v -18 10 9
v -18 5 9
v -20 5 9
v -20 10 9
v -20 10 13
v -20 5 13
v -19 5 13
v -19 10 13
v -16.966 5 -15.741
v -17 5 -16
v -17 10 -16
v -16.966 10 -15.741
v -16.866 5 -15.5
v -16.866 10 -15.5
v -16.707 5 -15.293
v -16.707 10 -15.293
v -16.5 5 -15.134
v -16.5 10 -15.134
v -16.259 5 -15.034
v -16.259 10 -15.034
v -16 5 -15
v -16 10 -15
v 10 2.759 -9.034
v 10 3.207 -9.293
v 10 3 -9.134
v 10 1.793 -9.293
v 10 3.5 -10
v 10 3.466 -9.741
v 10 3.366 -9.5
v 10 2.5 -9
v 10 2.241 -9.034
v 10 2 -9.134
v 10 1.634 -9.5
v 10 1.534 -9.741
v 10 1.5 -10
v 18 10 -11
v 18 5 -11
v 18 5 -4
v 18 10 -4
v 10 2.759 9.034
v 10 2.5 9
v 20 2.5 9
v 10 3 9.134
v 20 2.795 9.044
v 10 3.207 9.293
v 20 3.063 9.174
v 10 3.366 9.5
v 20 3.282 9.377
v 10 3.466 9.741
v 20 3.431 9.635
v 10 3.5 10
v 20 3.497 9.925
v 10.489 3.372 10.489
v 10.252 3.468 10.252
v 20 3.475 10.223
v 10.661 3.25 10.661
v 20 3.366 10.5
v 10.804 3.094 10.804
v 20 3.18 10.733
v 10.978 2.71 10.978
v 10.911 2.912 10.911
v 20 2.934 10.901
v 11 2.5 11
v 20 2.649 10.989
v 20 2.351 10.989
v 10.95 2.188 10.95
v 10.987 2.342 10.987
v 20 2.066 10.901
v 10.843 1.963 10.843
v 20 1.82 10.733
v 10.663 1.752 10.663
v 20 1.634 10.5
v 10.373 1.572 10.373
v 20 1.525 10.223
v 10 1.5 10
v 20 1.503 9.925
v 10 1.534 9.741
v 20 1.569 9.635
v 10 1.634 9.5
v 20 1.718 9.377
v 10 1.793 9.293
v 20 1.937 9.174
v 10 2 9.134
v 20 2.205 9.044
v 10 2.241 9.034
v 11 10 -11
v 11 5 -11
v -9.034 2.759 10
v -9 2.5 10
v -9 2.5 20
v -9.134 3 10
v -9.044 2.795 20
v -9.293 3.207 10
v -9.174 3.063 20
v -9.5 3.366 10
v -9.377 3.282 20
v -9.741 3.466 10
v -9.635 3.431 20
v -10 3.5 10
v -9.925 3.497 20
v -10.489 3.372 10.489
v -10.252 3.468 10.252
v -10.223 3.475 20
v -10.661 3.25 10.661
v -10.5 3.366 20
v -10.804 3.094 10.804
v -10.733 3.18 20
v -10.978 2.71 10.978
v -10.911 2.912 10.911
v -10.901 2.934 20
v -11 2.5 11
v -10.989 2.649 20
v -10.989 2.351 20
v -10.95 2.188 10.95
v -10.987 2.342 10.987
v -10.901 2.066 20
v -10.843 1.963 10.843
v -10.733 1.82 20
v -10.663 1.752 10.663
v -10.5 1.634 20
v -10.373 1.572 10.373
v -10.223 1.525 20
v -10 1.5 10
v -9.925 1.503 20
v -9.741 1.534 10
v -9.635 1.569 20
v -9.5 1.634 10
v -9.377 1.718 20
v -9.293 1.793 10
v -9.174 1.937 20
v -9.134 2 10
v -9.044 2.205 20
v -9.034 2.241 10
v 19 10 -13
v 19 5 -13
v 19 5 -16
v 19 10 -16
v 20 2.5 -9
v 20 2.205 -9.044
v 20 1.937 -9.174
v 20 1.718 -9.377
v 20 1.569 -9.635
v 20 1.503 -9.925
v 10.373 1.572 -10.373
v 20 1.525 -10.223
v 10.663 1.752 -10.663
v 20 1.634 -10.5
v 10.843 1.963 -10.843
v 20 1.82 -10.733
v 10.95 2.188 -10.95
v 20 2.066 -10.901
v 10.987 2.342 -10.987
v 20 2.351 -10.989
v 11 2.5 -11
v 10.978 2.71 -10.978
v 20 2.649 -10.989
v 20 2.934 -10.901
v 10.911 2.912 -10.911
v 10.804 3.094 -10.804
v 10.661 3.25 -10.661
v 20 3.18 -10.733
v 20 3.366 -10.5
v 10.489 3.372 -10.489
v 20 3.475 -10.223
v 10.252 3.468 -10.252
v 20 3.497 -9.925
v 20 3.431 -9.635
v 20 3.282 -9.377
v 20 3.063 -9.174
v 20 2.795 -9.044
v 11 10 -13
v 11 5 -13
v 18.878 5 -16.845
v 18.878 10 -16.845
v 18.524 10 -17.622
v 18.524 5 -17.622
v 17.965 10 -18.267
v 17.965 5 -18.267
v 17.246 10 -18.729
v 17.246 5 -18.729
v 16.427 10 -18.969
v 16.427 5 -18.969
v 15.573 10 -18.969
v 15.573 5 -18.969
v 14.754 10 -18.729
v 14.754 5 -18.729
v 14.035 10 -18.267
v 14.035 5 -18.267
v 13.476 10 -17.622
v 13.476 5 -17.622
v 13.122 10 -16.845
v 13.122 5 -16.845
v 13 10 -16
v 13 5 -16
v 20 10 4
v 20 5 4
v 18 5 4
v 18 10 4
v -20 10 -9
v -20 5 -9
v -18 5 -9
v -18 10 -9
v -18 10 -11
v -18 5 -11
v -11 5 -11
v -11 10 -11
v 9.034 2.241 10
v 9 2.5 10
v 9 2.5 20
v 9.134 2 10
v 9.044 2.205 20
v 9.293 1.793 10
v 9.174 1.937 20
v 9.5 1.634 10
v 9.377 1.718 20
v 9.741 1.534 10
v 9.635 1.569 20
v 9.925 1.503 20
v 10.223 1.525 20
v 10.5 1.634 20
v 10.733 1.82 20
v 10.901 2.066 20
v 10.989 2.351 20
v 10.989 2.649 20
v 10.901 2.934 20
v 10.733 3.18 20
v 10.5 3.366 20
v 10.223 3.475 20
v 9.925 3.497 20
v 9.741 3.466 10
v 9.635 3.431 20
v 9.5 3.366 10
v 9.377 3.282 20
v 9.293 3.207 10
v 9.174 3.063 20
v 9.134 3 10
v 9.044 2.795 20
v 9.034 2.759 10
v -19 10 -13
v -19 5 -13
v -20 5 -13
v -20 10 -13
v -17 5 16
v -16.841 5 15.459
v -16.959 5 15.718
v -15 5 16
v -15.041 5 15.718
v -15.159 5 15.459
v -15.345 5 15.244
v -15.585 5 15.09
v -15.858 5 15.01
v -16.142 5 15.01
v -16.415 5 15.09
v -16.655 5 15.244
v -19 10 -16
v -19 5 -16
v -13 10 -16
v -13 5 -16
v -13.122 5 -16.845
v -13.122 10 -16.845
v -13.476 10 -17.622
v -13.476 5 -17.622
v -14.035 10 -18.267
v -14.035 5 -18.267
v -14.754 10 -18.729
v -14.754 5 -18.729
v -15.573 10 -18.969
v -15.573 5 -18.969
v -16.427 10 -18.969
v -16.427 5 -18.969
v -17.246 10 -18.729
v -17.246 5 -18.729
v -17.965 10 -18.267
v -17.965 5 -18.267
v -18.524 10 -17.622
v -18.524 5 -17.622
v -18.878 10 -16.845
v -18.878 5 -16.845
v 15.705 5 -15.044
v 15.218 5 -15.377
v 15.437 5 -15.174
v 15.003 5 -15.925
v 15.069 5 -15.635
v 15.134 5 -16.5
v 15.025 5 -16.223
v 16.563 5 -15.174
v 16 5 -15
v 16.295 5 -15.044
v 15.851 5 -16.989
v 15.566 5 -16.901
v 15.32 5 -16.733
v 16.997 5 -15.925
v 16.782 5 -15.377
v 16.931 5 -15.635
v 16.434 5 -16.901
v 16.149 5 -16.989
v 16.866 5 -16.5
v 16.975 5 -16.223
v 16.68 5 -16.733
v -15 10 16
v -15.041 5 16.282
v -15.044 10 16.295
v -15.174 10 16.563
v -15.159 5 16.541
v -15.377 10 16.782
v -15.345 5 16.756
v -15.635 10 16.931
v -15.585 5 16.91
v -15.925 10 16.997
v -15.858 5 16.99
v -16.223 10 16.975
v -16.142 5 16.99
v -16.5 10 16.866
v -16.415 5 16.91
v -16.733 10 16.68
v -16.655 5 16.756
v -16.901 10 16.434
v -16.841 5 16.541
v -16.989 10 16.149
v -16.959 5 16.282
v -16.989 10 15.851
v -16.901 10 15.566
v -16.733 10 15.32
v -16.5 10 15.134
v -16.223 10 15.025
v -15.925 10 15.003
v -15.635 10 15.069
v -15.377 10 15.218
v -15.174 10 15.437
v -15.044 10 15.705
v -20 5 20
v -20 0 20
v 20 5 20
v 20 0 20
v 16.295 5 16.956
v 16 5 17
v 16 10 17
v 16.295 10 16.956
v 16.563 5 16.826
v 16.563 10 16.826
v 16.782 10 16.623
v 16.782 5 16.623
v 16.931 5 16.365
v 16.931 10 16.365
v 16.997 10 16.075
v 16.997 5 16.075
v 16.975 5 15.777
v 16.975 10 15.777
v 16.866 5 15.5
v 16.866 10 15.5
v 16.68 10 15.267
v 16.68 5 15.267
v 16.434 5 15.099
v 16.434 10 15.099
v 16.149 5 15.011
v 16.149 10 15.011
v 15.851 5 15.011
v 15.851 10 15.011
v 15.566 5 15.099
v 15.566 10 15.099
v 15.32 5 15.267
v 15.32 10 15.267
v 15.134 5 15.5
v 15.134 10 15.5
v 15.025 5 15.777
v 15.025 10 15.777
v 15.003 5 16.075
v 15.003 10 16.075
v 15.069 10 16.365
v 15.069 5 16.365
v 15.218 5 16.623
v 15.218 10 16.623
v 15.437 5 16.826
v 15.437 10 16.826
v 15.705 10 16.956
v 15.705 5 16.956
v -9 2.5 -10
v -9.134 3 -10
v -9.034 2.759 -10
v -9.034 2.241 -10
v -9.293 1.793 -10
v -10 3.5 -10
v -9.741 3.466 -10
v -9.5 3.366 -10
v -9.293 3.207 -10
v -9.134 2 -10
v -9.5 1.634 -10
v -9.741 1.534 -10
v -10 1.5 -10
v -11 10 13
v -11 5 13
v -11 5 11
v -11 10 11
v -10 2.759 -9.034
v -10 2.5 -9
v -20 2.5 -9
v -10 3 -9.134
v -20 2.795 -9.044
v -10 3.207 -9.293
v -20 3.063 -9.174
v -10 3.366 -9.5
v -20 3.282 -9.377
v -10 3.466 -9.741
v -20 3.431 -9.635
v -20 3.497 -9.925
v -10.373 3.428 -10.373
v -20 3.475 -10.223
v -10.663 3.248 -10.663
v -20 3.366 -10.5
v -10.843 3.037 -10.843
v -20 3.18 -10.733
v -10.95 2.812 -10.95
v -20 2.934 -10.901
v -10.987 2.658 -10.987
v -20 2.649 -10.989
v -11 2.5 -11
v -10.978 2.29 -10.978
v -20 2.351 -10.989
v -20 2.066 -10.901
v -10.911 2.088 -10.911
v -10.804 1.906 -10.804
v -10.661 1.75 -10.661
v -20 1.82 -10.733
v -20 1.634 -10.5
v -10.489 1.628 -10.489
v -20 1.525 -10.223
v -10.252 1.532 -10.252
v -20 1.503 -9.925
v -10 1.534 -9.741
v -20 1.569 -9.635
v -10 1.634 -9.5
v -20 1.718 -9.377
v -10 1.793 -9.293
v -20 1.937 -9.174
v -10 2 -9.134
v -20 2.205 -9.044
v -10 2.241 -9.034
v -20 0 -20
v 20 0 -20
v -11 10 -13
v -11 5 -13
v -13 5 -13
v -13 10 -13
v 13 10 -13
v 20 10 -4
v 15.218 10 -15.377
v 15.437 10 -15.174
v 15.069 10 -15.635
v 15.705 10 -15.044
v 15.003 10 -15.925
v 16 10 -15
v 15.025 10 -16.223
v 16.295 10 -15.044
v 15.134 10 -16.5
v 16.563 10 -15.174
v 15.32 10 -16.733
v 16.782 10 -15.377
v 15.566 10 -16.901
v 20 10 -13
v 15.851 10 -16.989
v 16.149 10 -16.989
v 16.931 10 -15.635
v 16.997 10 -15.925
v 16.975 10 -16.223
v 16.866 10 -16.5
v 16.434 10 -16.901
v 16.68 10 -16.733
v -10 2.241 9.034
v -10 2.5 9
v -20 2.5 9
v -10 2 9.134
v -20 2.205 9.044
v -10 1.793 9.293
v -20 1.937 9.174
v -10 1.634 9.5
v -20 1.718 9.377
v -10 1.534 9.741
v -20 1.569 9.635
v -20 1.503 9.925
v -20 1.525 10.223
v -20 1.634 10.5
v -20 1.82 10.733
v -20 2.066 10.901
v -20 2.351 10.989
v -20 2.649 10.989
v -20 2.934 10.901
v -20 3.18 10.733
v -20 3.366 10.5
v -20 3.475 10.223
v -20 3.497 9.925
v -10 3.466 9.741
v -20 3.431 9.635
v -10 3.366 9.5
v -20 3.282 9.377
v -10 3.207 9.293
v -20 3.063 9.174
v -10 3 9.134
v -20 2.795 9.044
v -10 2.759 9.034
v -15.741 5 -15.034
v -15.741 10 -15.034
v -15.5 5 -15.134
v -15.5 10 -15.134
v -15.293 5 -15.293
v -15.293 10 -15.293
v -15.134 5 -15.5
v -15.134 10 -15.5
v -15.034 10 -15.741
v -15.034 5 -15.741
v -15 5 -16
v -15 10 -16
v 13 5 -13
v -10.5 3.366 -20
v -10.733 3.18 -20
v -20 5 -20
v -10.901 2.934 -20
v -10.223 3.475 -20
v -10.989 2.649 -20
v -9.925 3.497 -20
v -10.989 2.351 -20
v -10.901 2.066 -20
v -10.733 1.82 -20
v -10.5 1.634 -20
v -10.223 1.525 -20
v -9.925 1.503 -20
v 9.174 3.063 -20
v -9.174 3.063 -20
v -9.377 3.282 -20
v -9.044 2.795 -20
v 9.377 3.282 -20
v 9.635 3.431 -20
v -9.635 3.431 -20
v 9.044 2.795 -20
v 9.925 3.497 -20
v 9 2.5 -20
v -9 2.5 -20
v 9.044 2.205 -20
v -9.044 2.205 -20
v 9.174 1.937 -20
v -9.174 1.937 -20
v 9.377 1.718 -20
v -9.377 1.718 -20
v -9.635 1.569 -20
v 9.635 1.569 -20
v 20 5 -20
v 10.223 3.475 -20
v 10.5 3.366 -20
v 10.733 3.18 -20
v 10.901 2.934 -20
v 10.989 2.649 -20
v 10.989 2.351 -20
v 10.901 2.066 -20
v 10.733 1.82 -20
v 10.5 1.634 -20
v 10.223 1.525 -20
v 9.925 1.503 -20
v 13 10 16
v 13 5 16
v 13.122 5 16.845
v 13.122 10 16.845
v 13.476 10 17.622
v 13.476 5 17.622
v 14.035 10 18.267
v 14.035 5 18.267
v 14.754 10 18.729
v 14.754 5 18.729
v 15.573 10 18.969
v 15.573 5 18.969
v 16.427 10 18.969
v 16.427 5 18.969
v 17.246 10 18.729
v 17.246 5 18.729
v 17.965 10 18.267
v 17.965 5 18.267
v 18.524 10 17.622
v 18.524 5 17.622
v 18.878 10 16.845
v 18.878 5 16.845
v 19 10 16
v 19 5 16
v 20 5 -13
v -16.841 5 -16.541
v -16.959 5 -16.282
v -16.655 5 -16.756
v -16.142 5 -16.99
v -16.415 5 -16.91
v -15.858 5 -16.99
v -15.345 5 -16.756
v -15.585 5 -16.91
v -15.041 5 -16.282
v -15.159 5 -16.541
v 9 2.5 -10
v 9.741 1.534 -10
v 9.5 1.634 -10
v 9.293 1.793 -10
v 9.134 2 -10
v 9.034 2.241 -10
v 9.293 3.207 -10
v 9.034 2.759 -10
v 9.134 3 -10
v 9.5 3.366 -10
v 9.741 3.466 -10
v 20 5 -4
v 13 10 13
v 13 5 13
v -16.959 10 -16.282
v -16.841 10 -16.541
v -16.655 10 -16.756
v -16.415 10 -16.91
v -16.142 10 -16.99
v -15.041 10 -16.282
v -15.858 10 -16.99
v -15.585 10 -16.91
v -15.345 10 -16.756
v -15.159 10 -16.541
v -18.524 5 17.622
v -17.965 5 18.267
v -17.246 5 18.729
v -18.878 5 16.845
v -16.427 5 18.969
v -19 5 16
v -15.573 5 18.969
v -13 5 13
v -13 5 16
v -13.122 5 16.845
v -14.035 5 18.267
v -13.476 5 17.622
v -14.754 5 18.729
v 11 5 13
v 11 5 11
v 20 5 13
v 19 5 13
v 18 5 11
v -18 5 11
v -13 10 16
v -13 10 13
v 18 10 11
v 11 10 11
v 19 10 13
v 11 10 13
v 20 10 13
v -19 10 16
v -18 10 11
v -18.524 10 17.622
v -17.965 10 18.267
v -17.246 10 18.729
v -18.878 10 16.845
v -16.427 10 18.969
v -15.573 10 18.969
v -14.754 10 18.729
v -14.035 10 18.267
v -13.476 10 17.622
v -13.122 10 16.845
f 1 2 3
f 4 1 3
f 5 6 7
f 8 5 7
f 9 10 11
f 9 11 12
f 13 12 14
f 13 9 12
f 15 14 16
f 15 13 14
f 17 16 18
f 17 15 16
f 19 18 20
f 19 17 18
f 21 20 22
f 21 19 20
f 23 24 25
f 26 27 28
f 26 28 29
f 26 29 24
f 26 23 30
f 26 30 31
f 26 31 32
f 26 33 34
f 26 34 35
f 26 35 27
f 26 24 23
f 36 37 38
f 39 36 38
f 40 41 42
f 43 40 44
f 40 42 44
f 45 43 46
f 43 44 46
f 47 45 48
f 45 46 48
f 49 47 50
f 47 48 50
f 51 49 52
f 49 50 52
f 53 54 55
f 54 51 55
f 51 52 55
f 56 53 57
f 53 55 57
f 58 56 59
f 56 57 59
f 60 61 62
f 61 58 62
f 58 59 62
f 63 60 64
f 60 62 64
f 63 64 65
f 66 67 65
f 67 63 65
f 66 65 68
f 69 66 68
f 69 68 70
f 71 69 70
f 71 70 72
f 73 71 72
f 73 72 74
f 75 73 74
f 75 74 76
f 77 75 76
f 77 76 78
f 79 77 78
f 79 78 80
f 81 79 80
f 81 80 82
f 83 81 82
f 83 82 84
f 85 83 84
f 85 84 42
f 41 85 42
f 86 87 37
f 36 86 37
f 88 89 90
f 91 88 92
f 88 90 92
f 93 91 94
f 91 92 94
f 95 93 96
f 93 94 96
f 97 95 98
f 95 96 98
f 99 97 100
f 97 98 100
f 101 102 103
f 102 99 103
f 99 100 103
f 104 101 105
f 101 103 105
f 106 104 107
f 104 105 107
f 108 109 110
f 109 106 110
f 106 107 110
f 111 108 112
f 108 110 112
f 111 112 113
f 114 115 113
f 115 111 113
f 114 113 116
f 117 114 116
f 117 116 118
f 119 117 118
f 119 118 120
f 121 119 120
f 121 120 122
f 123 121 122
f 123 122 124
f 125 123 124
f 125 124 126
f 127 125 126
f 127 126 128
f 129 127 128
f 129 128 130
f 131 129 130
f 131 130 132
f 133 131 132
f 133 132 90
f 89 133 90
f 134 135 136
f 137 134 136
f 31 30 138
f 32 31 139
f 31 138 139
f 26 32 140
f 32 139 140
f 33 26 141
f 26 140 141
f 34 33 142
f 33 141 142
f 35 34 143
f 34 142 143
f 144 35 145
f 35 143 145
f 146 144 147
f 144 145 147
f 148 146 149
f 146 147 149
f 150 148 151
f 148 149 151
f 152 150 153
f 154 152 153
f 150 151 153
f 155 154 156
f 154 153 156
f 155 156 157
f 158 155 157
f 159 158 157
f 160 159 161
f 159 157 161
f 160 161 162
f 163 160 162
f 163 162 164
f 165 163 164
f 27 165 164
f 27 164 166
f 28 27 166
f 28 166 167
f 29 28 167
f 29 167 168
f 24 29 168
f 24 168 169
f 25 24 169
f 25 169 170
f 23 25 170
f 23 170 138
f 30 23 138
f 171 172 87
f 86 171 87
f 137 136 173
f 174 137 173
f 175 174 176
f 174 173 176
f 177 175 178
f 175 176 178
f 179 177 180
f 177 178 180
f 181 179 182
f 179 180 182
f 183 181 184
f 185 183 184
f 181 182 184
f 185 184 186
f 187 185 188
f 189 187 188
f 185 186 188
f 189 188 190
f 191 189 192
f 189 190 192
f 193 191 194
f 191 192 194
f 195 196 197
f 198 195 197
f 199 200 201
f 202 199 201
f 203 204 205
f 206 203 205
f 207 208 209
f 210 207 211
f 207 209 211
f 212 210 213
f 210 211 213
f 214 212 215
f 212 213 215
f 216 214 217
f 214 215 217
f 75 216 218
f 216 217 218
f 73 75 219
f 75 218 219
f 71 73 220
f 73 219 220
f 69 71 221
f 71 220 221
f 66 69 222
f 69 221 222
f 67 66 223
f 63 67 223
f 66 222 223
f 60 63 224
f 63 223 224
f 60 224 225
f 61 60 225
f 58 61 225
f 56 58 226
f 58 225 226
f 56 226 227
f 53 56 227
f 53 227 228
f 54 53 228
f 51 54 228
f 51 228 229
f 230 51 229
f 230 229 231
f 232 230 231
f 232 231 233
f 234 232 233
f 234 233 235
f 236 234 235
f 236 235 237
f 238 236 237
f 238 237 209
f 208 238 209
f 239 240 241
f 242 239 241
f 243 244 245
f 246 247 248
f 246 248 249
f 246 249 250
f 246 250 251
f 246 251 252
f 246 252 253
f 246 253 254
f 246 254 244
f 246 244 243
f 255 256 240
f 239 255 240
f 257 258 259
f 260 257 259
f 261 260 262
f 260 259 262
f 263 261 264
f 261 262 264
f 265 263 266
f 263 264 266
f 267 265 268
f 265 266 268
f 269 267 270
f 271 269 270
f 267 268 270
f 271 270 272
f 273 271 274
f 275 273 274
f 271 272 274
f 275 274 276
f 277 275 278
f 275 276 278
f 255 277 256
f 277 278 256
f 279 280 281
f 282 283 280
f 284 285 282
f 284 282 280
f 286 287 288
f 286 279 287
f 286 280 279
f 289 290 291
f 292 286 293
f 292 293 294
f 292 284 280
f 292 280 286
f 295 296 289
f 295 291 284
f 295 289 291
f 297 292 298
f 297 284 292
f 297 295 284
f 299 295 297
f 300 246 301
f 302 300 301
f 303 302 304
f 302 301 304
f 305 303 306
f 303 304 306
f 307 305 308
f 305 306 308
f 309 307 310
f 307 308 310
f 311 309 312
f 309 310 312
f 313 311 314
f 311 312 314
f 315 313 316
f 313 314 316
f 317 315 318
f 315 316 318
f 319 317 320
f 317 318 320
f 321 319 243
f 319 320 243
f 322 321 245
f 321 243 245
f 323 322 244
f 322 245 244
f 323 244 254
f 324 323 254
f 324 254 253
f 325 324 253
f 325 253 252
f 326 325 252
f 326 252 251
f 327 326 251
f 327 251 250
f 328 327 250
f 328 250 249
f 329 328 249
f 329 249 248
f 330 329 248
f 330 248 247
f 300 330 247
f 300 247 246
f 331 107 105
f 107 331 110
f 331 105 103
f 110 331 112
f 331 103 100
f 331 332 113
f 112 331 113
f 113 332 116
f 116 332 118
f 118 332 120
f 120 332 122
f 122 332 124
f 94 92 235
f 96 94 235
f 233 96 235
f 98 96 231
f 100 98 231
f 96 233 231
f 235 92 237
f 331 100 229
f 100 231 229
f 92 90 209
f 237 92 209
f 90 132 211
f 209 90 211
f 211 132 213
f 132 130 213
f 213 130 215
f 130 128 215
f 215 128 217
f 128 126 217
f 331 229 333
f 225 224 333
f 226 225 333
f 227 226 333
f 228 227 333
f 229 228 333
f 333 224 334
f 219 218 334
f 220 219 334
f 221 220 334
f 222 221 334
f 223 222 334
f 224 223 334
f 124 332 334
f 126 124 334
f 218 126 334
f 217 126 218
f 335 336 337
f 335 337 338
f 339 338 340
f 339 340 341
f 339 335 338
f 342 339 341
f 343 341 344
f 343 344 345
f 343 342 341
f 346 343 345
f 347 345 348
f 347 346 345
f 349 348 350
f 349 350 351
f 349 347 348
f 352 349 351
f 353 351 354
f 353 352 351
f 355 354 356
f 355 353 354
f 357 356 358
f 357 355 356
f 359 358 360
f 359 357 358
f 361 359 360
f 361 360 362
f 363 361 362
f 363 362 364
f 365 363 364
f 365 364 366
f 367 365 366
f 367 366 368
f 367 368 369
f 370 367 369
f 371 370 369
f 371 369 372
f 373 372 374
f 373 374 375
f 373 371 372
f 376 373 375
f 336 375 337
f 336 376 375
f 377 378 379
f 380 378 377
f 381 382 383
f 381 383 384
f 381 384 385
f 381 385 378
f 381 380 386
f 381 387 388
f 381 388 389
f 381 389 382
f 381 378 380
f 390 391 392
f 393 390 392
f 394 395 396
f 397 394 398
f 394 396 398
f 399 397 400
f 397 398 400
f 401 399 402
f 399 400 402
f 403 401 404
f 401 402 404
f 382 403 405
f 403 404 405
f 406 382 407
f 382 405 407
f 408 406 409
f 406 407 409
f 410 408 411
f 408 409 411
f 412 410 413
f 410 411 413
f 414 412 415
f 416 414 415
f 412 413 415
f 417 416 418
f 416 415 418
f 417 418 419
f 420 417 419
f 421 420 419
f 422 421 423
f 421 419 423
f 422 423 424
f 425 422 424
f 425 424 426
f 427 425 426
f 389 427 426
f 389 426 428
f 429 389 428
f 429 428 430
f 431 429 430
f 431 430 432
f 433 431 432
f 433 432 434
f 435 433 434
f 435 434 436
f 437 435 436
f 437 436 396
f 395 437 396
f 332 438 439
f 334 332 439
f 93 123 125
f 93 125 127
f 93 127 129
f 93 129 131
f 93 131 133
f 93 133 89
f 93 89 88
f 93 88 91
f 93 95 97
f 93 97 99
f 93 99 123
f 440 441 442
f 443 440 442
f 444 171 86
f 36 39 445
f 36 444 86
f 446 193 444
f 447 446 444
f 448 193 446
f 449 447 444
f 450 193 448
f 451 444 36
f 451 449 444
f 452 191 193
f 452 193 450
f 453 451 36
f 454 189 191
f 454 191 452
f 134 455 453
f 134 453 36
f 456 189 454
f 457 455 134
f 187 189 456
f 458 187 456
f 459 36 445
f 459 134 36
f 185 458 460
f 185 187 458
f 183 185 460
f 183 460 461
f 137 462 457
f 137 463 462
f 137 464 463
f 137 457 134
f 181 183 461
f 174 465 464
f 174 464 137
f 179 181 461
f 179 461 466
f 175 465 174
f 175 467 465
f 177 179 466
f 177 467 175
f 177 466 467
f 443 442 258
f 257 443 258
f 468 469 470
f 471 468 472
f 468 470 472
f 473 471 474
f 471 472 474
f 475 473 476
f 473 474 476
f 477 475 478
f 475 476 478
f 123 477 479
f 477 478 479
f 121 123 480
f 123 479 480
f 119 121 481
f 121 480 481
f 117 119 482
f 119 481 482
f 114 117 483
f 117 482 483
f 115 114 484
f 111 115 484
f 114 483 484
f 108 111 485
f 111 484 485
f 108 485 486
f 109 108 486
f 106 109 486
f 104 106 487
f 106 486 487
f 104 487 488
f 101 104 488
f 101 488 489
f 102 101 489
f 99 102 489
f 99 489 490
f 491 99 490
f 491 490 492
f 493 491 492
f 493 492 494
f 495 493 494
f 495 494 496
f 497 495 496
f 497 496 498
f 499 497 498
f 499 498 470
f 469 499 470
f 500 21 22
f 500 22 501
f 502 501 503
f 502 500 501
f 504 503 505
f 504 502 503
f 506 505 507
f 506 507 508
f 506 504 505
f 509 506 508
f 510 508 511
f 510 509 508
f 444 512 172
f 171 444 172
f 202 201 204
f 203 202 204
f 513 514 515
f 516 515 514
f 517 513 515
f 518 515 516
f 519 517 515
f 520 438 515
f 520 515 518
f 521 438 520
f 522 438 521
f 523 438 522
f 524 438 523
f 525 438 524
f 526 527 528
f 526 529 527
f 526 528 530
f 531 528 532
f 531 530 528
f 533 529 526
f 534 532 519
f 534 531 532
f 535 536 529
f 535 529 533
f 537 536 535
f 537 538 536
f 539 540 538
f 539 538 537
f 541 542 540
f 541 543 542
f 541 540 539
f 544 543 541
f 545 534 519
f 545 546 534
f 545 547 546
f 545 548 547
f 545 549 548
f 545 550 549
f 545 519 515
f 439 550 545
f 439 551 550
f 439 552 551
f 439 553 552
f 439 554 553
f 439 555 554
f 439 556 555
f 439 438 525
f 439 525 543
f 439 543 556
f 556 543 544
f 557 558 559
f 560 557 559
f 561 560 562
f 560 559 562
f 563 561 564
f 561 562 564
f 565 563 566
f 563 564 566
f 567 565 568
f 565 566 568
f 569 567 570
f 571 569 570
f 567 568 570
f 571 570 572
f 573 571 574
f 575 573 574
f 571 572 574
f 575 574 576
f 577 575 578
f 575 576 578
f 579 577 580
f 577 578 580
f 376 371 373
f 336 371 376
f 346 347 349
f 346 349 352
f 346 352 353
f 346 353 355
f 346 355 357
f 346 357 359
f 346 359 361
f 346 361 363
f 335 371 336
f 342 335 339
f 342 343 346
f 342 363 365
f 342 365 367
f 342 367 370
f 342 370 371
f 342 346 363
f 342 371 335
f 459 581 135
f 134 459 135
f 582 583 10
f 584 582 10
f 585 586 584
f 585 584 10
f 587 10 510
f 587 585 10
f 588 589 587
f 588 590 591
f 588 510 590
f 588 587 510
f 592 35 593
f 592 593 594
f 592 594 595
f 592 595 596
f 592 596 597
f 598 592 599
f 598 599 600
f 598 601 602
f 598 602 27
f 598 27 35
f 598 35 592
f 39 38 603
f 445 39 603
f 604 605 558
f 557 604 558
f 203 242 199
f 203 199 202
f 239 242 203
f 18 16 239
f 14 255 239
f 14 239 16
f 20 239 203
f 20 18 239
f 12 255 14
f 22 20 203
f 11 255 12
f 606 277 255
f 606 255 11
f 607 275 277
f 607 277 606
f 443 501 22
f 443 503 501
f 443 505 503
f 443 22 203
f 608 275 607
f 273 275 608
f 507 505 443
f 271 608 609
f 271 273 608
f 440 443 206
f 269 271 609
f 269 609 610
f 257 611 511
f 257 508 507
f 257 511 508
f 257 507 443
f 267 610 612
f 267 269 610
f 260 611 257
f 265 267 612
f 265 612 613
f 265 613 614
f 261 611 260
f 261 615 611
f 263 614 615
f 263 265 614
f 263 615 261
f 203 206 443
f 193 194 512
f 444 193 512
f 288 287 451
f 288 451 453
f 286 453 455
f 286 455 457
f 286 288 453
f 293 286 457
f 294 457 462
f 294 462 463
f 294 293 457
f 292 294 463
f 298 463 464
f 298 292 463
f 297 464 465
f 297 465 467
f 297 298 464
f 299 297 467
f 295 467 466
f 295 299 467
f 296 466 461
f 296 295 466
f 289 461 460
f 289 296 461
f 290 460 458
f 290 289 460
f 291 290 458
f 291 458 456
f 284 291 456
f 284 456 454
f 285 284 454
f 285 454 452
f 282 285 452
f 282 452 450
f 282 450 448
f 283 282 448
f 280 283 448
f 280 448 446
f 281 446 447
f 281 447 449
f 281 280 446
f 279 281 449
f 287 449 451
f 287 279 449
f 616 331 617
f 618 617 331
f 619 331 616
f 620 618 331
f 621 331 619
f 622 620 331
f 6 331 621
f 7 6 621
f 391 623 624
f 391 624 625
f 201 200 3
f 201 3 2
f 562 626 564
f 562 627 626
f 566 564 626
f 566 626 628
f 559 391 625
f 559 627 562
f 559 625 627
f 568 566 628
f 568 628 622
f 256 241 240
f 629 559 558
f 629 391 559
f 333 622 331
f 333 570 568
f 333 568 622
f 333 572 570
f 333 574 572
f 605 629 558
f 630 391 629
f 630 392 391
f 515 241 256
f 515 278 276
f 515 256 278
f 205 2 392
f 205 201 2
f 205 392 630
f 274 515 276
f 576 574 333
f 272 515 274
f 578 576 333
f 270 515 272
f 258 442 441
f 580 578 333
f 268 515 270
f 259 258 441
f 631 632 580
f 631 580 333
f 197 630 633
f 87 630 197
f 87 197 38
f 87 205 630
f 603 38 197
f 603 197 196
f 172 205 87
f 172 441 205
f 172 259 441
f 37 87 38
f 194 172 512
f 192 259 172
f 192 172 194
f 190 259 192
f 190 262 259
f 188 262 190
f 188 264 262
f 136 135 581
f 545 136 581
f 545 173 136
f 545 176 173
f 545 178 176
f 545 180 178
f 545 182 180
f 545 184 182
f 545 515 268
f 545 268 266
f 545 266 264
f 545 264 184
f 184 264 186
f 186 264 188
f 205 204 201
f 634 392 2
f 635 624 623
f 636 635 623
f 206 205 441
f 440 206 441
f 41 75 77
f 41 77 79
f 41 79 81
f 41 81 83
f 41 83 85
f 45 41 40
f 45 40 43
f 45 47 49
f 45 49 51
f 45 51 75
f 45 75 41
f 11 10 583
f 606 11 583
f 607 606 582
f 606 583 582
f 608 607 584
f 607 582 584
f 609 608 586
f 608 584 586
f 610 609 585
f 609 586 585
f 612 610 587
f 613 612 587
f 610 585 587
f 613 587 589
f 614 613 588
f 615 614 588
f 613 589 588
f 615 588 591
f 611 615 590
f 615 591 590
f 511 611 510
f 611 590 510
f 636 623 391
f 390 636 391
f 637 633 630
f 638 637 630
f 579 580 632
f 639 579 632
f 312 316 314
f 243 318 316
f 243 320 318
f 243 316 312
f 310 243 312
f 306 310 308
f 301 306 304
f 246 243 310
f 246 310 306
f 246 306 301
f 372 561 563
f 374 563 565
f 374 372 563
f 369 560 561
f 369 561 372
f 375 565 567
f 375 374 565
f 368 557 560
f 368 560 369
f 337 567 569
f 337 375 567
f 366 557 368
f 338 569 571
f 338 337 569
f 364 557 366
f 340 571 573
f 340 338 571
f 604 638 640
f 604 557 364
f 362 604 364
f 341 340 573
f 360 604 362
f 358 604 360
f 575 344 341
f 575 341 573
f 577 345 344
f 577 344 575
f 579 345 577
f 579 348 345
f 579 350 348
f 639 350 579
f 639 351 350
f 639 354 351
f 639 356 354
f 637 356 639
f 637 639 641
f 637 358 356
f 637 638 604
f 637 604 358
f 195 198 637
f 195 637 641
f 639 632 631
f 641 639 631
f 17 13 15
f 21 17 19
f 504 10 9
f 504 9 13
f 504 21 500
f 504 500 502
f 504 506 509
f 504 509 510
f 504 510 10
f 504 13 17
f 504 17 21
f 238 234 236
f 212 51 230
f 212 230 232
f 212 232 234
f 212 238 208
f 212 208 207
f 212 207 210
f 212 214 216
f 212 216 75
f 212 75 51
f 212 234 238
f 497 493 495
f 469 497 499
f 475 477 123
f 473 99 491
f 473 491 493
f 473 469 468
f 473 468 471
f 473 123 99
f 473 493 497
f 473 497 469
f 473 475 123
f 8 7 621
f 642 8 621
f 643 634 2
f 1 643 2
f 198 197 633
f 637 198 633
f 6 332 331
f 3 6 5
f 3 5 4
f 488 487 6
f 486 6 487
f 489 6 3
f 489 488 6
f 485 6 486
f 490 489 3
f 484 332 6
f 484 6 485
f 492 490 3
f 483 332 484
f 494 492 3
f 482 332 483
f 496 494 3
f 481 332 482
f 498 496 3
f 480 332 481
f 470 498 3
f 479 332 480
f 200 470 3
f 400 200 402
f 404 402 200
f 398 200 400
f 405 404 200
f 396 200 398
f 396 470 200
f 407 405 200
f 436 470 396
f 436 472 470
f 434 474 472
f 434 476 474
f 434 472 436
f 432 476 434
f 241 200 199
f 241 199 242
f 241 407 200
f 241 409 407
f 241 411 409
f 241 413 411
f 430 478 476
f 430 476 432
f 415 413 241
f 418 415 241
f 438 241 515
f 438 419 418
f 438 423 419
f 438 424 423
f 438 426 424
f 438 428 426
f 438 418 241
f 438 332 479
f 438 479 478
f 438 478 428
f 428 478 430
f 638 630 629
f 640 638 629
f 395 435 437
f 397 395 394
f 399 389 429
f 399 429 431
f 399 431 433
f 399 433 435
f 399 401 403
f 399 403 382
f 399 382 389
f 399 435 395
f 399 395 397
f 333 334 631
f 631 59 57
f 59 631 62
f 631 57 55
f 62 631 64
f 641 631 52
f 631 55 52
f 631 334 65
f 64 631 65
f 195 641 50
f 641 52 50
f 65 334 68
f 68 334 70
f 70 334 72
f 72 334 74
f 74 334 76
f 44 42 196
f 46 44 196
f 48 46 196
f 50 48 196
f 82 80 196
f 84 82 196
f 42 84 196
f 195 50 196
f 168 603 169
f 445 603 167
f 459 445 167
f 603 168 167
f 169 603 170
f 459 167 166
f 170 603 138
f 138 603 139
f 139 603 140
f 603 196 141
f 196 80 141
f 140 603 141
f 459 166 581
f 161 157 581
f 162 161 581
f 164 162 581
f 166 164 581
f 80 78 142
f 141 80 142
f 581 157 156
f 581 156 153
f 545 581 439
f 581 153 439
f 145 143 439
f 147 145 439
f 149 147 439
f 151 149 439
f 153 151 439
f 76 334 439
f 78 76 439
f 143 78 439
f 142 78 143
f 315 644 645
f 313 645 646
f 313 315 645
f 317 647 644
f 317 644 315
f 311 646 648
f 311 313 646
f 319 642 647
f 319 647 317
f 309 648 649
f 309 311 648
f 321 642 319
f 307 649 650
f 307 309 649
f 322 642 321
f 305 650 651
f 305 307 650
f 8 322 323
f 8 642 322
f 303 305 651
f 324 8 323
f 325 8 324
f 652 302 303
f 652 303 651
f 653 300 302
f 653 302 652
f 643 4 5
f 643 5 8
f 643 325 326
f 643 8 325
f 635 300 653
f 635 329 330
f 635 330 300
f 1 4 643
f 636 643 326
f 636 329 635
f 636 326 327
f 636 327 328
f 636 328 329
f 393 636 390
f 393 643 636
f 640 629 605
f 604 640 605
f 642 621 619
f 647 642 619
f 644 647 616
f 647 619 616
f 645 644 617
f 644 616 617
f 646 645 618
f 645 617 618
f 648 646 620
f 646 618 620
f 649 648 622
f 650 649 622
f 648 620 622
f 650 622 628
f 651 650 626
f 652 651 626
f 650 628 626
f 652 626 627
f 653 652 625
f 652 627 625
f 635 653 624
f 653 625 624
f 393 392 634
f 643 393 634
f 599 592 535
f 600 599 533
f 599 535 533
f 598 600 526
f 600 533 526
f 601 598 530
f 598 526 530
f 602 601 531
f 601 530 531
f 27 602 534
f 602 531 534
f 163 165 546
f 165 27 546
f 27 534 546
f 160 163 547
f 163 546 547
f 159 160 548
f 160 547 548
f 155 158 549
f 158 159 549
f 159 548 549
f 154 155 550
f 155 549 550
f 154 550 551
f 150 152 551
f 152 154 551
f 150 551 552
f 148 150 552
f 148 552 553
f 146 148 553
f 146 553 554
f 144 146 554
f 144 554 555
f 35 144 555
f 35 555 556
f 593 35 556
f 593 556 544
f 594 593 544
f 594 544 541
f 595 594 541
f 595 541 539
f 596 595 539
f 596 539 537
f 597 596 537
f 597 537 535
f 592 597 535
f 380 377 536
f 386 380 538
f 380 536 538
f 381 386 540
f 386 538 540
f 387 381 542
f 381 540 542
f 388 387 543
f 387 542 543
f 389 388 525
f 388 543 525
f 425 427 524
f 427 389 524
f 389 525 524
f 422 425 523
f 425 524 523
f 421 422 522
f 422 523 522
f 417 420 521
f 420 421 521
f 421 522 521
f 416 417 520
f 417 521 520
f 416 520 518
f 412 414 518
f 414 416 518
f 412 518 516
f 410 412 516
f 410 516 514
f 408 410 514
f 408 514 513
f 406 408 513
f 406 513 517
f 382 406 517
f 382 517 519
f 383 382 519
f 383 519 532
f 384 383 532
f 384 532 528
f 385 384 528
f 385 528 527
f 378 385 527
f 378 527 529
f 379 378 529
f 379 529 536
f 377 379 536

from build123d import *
from build123d.topology import SkipClean

# Parameters (mm, degrees)
SKETCH1_W           = 40
SKETCH1_H           = 40
BOSS_EXTRUDE1_DEPTH = 5
SKETCH3_R           = 1
BOSS_EXTRUDE3_DEPTH = 5
SKETCH3_4_R         = 1
CUT_EXTRUDE1_DEPTH  = 5
SKETCH4_R           = 1
CUT_EXTRUDE2_DEPTH  = 10
CIRPATTERN2_COUNT   = 4


with BuildPart() as part:
    # Sketch1 → Boss-Extrude1 (new body)
    with BuildSketch(Plane(origin=(0, 0, 0), x_dir=(1, 0, 0), z_dir=(0, 1, 0))):
        Rectangle(SKETCH1_W, SKETCH1_H)
    extrude(amount=BOSS_EXTRUDE1_DEPTH)

    # Sketch3 → Boss-Extrude3 (add)
    # profile 1 of 4: a face of its own
    with BuildSketch(Plane(origin=(0, 5, 0), x_dir=(1, 0, 0), z_dir=(0, 1, 0))):
        with BuildLine():
            Line((11, 11), (18, 11))
            Line((18, 11), (18, 4))
            Line((18, 4), (20, 4))
            Line((20, 4), (20, 13))
            Line((20, 13), (19, 13))
            Line((19, 13), (19, 16))
            ThreePointArc((19, 16), (16, 19), (13, 16))
            Line((13, 16), (13, 13))
            Line((13, 13), (11, 13))
            Line((11, 13), (11, 11))
        make_face()
        with Locations((16, 16)):
            Circle(SKETCH3_R, mode=Mode.SUBTRACT)
    # profile 2 of 4: a face of its own
    with BuildSketch(Plane(origin=(0, 5, 0), x_dir=(1, 0, 0), z_dir=(0, 1, 0))):
        with BuildLine():
            Line((-18, 11), (-11, 11))
            Line((-11, 11), (-11, 13))
            Line((-11, 13), (-13, 13))
            Line((-13, 13), (-13, 16))
            ThreePointArc((-13, 16), (-16, 19), (-19, 16))
            Line((-19, 16), (-19, 13))
            Line((-19, 13), (-20, 13))
            Line((-20, 13), (-20, 9))
            Line((-20, 9), (-18, 9))
            Line((-18, 9), (-18, 11))
        make_face()
        with BuildLine():
            ThreePointArc((-17, 16), (-16, 17), (-15, 16))
            Line((-15, 16), (-17, 16))
        make_face(mode=Mode.SUBTRACT)
    # profile 3 of 4: a face of its own
    with BuildSketch(Plane(origin=(0, 5, 0), x_dir=(1, 0, 0), z_dir=(0, 1, 0))):
        with BuildLine():
            Line((20, -4), (18, -4))
            Line((18, -4), (18, -11))
            Line((18, -11), (11, -11))
            Line((11, -11), (11, -13))
            Line((11, -13), (13, -13))
            Line((13, -13), (13, -16))
            ThreePointArc((13, -16), (16, -19), (19, -16))
            Line((19, -16), (19, -13))
            Line((19, -13), (20, -13))
            Line((20, -13), (20, -4))
        make_face()
    # profile 4 of 4: a face of its own
    with BuildSketch(Plane(origin=(0, 5, 0), x_dir=(1, 0, 0), z_dir=(0, 1, 0))):
        with BuildLine():
            Line((-11, -13), (-11, -11))
            Line((-11, -11), (-18, -11))
            Line((-18, -11), (-18, -9))
            Line((-18, -9), (-20, -9))
            Line((-20, -9), (-20, -13))
            Line((-20, -13), (-19, -13))
            Line((-19, -13), (-19, -16))
            ThreePointArc((-19, -16), (-16, -19), (-13, -16))
            Line((-13, -16), (-13, -13))
            Line((-13, -13), (-11, -13))
        make_face()
        with BuildLine():
            ThreePointArc((-15, -16), (-16, -17), (-17, -16))
            Line((-17, -16), (-15, -16))
        make_face(mode=Mode.SUBTRACT)
    extrude(amount=BOSS_EXTRUDE3_DEPTH)

    # Sketch3<4> → Cut-Extrude1 (cut)
    with SkipClean():  # the faces are left unmerged after this step: merging them gives an invalid solid
        with BuildSketch(Plane(origin=(0, 5, 0), x_dir=(1, 0, 0), z_dir=(0, 1, 0))):
            with Locations((-16, 16)):
                Circle(SKETCH3_4_R)
            with Locations((-16, -16)):
                Circle(SKETCH3_4_R)
            with Locations((16, -16)):
                Circle(SKETCH3_4_R)
        extrude(amount=CUT_EXTRUDE1_DEPTH, mode=Mode.SUBTRACT)

    # Sketch4 → Cut-Extrude2 (cut)
    with SkipClean():  # the faces are left unmerged after this step: merging them gives an invalid solid
        with BuildSketch(Plane.ZY.offset(20)):
            with Locations((-10, 2.5)):
                Circle(SKETCH4_R)
            with Locations((10, 2.5)):
                Circle(SKETCH4_R)
        cut_extrude2 = extrude(amount=-CUT_EXTRUDE2_DEPTH, mode=Mode.SUBTRACT)

    # CirPattern2: Cut-Extrude2 ×4 about axis
    with SkipClean():  # the faces are left unmerged after this step: merging them gives an invalid solid
        cirpattern2_axis = Axis((0, 0, 0), (0, -1, 0))
        for i in range(1, CIRPATTERN2_COUNT):
            add(cut_extrude2.rotate(cirpattern2_axis, i * 360 / CIRPATTERN2_COUNT), mode=Mode.SUBTRACT)


solid = part.part
